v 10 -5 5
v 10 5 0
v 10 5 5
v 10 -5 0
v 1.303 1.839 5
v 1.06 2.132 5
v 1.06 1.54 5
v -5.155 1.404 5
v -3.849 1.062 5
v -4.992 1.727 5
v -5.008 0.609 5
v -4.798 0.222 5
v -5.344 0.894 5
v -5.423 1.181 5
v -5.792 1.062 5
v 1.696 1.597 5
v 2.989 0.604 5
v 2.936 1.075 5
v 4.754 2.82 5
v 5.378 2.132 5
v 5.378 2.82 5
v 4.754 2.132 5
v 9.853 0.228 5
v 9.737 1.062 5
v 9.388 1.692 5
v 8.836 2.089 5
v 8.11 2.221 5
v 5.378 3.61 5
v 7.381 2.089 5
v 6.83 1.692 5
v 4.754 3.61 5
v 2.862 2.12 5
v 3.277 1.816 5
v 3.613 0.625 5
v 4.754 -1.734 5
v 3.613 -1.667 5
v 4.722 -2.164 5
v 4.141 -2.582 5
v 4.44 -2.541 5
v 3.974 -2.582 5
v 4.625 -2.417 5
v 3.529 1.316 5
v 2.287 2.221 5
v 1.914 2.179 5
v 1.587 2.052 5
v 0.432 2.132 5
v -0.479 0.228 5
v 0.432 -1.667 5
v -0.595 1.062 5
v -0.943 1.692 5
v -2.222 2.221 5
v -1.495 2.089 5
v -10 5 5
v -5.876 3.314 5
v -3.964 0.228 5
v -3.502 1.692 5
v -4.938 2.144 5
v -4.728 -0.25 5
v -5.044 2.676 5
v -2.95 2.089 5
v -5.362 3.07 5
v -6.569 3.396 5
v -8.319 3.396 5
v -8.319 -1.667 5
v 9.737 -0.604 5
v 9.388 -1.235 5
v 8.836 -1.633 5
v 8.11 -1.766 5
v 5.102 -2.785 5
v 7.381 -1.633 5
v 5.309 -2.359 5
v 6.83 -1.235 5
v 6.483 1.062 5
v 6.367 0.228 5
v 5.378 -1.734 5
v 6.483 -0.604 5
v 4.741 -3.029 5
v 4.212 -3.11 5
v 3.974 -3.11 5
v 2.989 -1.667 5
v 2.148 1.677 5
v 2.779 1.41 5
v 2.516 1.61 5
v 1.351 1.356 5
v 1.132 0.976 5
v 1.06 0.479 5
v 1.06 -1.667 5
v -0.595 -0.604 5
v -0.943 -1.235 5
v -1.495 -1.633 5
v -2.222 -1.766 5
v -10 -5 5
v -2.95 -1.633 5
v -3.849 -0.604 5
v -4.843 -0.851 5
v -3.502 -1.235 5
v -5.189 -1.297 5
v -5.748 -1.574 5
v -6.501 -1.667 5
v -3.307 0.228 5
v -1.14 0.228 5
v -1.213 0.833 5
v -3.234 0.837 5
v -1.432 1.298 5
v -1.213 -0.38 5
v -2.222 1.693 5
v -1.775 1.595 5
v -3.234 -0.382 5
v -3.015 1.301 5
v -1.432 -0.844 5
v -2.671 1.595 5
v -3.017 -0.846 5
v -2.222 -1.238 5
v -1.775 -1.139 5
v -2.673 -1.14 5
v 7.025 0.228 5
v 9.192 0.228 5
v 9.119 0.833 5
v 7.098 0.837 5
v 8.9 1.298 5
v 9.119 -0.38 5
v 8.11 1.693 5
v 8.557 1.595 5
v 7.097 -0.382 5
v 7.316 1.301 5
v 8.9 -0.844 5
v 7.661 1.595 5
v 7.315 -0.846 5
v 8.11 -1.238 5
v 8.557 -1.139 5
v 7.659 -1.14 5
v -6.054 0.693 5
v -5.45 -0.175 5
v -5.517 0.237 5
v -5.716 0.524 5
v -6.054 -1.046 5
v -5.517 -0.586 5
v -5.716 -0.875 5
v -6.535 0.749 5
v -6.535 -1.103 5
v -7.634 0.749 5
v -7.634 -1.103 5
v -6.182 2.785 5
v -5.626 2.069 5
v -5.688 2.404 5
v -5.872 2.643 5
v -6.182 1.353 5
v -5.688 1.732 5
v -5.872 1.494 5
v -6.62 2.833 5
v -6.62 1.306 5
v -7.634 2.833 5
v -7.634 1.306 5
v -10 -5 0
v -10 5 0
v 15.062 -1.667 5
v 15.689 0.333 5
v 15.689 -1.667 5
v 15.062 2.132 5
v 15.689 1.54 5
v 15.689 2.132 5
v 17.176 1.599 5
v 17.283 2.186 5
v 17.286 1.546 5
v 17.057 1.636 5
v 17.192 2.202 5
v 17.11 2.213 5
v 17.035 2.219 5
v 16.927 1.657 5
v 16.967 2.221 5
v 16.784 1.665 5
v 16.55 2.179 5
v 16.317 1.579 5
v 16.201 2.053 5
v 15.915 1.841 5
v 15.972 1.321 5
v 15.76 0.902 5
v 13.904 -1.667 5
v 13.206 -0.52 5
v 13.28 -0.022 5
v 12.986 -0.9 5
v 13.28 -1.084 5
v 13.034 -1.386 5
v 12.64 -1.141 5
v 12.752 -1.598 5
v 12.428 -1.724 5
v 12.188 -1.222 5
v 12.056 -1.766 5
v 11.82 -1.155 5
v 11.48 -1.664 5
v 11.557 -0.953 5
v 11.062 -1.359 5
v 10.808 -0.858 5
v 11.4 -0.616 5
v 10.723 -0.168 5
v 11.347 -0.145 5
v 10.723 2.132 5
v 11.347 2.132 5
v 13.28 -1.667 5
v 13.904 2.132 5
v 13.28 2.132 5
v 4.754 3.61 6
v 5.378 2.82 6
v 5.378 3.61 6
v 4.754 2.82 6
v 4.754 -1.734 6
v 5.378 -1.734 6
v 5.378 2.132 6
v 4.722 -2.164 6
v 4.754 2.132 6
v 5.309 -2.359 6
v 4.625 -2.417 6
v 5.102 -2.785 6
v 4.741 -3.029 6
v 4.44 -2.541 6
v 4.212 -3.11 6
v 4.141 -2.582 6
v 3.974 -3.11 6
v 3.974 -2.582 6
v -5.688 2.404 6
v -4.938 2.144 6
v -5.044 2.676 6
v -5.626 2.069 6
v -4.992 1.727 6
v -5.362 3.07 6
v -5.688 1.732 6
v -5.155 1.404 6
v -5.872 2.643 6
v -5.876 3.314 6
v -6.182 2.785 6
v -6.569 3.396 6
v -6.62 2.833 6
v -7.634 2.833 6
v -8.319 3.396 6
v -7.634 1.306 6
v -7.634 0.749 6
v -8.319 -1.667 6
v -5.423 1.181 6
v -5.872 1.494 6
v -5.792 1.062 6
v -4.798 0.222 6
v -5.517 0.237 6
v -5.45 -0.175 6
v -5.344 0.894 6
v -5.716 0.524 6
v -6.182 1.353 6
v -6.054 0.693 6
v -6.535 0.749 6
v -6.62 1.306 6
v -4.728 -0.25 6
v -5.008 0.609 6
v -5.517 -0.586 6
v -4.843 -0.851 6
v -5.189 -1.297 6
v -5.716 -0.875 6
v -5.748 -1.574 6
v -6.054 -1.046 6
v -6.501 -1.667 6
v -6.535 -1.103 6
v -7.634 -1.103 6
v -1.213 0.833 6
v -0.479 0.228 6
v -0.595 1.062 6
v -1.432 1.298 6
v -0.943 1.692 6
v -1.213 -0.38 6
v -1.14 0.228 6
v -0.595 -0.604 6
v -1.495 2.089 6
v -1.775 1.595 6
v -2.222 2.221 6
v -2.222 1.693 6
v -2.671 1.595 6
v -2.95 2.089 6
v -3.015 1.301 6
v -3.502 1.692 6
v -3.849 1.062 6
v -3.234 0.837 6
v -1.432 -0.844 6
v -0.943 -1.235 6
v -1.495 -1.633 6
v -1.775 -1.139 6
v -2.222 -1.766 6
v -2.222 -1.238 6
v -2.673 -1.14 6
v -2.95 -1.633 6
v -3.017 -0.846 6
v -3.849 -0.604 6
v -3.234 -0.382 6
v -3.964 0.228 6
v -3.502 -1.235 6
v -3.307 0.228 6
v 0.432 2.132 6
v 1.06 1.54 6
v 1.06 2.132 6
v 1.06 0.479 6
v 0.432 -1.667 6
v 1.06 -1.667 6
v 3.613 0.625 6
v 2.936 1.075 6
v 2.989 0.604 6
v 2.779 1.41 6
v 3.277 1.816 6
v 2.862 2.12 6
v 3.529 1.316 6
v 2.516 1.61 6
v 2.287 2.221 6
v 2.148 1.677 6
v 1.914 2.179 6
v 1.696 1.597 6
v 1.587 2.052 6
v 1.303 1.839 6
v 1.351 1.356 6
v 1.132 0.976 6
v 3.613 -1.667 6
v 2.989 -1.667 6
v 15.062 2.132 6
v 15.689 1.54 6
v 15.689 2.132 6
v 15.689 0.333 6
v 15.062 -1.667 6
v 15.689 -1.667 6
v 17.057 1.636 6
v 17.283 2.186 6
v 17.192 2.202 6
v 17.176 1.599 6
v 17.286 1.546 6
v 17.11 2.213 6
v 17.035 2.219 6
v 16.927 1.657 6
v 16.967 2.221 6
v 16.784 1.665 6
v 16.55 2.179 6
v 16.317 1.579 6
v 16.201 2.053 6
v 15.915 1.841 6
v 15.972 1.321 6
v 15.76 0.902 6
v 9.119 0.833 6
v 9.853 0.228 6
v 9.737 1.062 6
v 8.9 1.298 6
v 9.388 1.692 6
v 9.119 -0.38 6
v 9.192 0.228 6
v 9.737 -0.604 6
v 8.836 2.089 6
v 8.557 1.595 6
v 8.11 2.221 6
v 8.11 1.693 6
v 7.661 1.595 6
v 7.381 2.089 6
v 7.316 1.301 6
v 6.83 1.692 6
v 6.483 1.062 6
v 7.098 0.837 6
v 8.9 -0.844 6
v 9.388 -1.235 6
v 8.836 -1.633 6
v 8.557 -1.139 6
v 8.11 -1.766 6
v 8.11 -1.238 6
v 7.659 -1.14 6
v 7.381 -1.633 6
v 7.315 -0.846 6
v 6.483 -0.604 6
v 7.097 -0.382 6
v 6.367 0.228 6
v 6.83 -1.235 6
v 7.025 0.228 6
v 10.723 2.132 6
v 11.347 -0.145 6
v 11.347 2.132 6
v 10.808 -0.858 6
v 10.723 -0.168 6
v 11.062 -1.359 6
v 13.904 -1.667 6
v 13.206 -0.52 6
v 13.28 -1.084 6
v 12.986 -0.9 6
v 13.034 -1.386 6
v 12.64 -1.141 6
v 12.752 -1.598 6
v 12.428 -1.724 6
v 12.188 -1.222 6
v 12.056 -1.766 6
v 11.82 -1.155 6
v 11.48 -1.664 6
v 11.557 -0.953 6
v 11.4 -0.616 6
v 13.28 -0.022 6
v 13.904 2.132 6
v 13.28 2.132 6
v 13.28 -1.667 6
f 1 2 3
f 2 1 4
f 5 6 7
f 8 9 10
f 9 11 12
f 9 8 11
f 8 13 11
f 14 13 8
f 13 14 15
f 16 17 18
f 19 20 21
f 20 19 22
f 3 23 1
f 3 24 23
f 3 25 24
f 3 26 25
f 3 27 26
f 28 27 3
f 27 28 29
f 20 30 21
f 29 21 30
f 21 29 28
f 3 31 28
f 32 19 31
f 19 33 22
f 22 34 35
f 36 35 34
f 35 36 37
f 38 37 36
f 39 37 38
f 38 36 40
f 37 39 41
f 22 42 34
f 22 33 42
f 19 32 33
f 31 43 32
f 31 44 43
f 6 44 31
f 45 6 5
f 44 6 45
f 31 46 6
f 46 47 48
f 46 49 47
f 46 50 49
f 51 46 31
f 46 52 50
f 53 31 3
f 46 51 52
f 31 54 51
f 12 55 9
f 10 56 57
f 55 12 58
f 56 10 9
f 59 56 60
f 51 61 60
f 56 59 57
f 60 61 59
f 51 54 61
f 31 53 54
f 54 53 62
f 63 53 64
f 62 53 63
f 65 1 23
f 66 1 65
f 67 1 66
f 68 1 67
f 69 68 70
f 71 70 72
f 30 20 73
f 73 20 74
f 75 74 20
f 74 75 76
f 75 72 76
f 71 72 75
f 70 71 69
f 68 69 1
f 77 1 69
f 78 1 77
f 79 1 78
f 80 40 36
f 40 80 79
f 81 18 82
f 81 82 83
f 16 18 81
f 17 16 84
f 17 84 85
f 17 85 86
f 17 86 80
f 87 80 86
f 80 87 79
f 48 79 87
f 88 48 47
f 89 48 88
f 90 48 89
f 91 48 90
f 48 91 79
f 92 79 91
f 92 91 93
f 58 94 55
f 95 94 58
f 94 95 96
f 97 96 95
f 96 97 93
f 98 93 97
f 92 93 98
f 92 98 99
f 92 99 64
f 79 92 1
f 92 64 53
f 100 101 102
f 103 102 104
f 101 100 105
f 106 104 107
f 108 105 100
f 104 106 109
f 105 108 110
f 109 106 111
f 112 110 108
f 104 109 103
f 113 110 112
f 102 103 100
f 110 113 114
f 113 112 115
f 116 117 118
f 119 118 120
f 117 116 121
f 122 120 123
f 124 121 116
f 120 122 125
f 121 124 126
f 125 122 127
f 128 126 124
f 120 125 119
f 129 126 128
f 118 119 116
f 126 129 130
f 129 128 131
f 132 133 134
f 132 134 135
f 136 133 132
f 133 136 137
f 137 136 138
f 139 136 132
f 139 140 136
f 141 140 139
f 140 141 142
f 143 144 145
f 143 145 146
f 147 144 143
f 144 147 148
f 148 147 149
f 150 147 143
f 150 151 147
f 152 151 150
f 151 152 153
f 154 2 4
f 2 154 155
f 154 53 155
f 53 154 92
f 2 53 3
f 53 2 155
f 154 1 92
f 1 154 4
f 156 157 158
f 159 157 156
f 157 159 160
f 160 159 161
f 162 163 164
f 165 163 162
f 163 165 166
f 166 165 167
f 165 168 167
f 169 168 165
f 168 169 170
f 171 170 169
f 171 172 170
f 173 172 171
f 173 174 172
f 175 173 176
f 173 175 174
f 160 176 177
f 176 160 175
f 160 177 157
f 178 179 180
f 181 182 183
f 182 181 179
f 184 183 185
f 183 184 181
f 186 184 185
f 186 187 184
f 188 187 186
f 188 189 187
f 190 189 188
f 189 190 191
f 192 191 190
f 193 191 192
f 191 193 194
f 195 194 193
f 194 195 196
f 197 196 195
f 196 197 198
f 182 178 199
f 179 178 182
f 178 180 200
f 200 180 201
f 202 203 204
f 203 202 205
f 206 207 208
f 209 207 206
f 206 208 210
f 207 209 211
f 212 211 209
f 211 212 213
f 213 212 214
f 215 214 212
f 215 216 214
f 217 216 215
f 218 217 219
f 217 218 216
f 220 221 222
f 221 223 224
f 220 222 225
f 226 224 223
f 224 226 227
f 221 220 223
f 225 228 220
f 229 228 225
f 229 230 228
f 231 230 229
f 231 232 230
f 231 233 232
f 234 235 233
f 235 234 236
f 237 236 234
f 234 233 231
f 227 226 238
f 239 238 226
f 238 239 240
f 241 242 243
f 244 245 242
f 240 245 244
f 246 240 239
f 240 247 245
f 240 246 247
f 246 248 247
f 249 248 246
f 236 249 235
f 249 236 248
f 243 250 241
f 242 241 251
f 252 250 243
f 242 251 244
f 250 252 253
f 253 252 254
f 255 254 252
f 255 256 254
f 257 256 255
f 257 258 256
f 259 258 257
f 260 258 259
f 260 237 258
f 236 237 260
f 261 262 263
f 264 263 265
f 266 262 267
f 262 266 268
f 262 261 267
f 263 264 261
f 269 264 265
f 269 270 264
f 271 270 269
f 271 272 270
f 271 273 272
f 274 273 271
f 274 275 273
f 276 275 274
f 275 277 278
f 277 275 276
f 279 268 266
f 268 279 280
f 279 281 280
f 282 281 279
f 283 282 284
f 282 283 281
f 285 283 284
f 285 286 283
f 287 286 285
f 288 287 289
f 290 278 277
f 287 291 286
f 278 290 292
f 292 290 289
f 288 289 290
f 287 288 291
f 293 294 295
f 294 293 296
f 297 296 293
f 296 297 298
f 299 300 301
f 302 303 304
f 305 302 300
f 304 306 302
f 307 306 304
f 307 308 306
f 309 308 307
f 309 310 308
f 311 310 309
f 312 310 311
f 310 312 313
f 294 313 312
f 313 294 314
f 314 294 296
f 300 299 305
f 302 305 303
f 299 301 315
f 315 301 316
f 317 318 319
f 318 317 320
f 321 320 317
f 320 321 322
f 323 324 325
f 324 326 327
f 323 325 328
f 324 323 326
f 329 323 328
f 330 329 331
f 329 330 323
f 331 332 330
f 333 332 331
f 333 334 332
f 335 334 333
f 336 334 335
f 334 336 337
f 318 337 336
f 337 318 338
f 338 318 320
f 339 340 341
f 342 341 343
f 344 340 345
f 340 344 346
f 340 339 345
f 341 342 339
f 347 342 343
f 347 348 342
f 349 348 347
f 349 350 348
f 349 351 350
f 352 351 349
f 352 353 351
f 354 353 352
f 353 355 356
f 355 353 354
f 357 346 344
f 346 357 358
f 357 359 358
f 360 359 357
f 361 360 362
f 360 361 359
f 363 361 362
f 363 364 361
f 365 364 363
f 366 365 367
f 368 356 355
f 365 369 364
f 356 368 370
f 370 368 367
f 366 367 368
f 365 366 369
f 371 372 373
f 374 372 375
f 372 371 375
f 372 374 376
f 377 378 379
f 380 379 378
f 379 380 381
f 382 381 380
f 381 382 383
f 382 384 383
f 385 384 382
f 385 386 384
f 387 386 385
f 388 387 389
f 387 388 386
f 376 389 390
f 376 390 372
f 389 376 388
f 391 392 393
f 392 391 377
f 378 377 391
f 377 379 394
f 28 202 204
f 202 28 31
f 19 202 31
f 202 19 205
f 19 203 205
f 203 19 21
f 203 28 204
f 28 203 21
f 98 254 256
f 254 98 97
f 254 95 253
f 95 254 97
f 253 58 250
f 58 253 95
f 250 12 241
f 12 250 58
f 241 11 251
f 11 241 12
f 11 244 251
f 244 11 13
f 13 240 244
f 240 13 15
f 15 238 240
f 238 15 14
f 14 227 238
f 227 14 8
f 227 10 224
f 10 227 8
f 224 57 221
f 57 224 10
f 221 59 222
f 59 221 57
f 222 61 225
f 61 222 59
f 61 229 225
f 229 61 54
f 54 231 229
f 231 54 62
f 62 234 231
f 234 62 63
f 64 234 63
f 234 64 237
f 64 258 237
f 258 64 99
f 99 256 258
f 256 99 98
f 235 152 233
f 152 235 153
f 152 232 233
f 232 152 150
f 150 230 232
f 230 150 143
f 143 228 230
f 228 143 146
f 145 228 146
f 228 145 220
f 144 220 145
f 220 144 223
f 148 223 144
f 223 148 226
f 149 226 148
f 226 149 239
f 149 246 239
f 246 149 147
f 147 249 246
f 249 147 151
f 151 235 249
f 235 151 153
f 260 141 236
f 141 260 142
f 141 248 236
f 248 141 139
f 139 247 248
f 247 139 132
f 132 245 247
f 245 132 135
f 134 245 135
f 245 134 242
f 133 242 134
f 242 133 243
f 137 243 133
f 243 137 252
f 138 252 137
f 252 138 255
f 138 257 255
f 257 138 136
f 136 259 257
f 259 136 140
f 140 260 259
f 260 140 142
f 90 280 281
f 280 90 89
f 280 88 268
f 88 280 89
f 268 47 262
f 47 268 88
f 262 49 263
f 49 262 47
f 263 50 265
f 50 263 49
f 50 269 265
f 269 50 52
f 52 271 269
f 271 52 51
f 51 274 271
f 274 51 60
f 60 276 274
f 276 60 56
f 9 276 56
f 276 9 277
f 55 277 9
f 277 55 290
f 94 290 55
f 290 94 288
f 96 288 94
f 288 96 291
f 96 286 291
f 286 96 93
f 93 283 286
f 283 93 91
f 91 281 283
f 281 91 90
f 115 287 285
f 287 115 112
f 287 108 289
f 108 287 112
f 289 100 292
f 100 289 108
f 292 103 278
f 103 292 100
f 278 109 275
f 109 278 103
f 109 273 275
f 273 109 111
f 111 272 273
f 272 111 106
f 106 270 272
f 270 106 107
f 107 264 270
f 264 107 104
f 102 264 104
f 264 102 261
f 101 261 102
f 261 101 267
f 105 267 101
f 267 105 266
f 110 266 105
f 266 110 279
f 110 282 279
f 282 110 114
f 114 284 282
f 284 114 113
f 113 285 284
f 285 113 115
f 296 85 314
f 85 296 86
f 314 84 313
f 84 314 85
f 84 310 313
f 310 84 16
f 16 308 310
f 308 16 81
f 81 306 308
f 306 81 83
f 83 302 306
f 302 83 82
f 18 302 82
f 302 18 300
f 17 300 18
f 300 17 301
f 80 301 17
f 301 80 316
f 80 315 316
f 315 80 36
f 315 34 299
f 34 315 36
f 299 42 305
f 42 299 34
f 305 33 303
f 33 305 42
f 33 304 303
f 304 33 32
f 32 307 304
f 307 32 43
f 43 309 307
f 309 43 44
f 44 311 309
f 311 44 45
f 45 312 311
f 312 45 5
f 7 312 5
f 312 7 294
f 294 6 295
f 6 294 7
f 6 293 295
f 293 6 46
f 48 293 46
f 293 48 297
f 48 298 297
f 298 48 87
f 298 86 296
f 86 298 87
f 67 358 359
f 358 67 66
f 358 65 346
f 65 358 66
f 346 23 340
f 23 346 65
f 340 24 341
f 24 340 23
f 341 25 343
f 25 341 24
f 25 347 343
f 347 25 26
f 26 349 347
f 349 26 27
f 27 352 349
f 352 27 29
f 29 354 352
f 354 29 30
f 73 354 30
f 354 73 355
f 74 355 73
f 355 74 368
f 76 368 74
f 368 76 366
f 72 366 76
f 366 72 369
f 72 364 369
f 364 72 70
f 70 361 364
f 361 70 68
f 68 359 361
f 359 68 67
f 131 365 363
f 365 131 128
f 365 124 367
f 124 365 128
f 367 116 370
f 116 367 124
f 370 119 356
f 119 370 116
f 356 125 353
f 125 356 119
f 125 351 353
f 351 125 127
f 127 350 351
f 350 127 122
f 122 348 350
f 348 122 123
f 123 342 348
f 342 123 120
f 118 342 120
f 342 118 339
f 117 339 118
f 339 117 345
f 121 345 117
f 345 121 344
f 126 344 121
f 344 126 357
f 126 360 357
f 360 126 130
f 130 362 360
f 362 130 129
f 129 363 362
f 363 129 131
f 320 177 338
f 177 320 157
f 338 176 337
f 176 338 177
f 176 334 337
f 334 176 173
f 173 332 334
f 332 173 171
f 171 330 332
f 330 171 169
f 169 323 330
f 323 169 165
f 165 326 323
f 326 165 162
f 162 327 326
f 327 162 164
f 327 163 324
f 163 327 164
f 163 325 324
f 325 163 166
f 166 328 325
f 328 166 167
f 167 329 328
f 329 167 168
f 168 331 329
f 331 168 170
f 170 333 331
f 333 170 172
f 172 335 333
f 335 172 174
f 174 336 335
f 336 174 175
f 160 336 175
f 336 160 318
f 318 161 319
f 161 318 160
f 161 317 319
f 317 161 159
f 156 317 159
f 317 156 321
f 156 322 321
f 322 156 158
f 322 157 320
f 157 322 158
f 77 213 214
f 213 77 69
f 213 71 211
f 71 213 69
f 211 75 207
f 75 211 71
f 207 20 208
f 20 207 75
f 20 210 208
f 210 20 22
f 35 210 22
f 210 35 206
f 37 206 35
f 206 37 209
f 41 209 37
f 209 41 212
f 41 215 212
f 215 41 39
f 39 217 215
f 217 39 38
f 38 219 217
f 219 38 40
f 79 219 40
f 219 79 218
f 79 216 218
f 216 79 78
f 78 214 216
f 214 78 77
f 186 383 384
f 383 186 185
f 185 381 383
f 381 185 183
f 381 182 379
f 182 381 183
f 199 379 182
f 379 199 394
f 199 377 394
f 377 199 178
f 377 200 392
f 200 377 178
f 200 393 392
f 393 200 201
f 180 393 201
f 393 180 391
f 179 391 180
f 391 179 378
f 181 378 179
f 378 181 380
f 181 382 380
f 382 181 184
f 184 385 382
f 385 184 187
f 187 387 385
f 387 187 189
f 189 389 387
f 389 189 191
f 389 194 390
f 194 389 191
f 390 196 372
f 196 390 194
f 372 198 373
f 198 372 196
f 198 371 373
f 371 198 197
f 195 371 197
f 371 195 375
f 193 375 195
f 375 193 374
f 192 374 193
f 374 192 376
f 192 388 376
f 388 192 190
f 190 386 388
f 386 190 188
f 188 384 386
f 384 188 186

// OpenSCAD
$fn = 10; 
texte_a_inserer = "Bonjour"; 
taille = 5; 
police = "DejaVuSans"; //[[Abril Fatface,Aclonica,Acme,Advent Pro,Akronim,Aladin,Alegreya,Alegreya Sans,Alegreya SC,Alex Brush,Alfa Slab One,Alice,Amaranth,Architects Daughter,Archivo Black,Archivo Narrow,Arimo,Arvo,Asap,Astloch,Asul,Averia Libre,Averia Serif Libre,Bangers,Basic,Belgrano,Berkshire Swash,Bigshot One,Bilbo Swash Caps,Black Ops One,Bonbon,Bowlby One SC,Brawler,Bubblegum Sans,Butterfly Kids,Cabin Condensed,Caesar Dressing,Cagliostro,Calligraffitti,Capriola,Carter One,Changa One,Chango,Chelsea Market,Cherry Cream Soda,Chewy,Chicle,Chivo,Clicker Script,Coming Soon,Concert One,Condiment,Cookie,Courgette,Covered By Your Grace,Crimson Text,Dancing Script,DejaVu Sans,DejaVu Serif,Dhurjati,Doppio One,Dosis,Droid Sans,Eagle Lake,Electrolize,Emilys Candy,Encode Sans,Encode Sans Compressed,Euphoria Script,Exo,Exo 2,Faster One,Federo,Finger Paint,Fjord One,Fontdiner Swanky,Freckle Face,Fruktur,Gabriela,Geo,Germania One,Give You Glory,Gloria Hallelujah,Goudy Bookletter 1911,Graduate,Grand Hotel,Great Vibes,Griffy,Hanalei Fill,Happy Monkey,Henny Penny,Hind,IM Fell English SC,Indie Flower,Irish Grover,Italianno,Jacques Francois Shadow,Jolly Lodger,Josefin Slab,Joti One,Judson,Just Another Hand,Kalam,Kameron,Karma,Kavoon,Knewave,Kranky,Kristi,Laila,Lakki Reddy,Lancelot,Lato,Leckerli One,Ledger,Lekton,Lemon One,Liberation Sans,Libre Caslon Text,Life Savers,Lilita One,Lily Script One,Limelight,Lobster,Lobster Two,Londrina Outline,Londrina Shadow,Londrina Solid,Lora,Love Ya Like A Sister,Loved by the King,Lovers Quarrel,Luckiest Guy,Lusitana,Macondo,Macondo Swash Caps,Mako,Marck Script,Margarine,Marko One,Maven Pro,McLaren,MedievalSharp,Merienda One,Merriweather,Mervale Script,Metal Mania,Metrophobic,Milonga,Miltonian Tattoo,Miss Fajardose,Molle,Montez,Montserrat,Mr De Haviland,Mystery Quest,Neucha,New Rocker,Niconne,Nosifer,Nothing You Could Do,Noto Sans Oriya,Noto Serif,Nova Square,Nunito,Old Standard TT,Oleo Script,Oleo Script Swash Caps,Orbitron,Oregano,Orienta,Original Surfer,Oswald,Over the Rainbow,Overlock,Oxygen,Pacifico,Paprika,Parisienne,Patrick Hand SC,Paytone One,Peralta,Permanent Marker,Piedra,Pirata One,Play,Playball,Poetsen One,Poppins,Press Start 2P,Princess Sofia,PT Mono,Qwigley,Racing Sans One,Raleway,Rancho,Ranga,Ribeye,Roboto,Roboto Condensed,Roboto Slab,Rochester,Rock Salt,Rubik One,Sail,Salsa,Sansita One,Sarina,Satisfy,Schoolbell,Seaweed Script,Sevillana,Shadows Into Light,Shadows Into Light Two,Share,Six Caps,Skranji,Source Sans Pro,Spicy Rice,Stardos Stencil,Stoke,Syncopate,Teko,Terminal Dosis,The Girl Next Door,Tillana,Timmana,Titillium Web,Ubuntu,Ultra,Underdog,UnifrakturCook,UnifrakturMaguntia,Vampiro One,Vidaloka,Viga,Voces,Volkhov,Vollkorn,Voltaire,Waiting for the Sunrise,Wallpoet,Wellfleet,Wendy One,Yellowtail,Yesteryear,Zeyada]]
hauteur = 1; 
longueur_cube = 20; 
largeur_cube = 10; 
hauteur_cube = 5; 
// relief = relief  extrusion = extru
relief = "relief"; //[relief,extru]
module rendu(){
linear_extrude(hauteur) text(texte_a_inserer,size = taille, font = police);
}
module finao(){
if ( relief== "relief") {
   union(){
 translate([0,0,0])   cube([longueur_cube,largeur_cube,hauteur_cube]);
translate([1,(largeur_cube/3),hauteur_cube]) rendu();
   } 
}
else
{
difference(){
 translate([0,0,0])   cube([longueur_cube,largeur_cube,hauteur_cube]);
translate([1,(largeur_cube/3),(hauteur_cube -hauteur+0.1)]) rendu();
}
 }
}
translate ([-(longueur_cube/2),-(largeur_cube/2),0]) finao();
